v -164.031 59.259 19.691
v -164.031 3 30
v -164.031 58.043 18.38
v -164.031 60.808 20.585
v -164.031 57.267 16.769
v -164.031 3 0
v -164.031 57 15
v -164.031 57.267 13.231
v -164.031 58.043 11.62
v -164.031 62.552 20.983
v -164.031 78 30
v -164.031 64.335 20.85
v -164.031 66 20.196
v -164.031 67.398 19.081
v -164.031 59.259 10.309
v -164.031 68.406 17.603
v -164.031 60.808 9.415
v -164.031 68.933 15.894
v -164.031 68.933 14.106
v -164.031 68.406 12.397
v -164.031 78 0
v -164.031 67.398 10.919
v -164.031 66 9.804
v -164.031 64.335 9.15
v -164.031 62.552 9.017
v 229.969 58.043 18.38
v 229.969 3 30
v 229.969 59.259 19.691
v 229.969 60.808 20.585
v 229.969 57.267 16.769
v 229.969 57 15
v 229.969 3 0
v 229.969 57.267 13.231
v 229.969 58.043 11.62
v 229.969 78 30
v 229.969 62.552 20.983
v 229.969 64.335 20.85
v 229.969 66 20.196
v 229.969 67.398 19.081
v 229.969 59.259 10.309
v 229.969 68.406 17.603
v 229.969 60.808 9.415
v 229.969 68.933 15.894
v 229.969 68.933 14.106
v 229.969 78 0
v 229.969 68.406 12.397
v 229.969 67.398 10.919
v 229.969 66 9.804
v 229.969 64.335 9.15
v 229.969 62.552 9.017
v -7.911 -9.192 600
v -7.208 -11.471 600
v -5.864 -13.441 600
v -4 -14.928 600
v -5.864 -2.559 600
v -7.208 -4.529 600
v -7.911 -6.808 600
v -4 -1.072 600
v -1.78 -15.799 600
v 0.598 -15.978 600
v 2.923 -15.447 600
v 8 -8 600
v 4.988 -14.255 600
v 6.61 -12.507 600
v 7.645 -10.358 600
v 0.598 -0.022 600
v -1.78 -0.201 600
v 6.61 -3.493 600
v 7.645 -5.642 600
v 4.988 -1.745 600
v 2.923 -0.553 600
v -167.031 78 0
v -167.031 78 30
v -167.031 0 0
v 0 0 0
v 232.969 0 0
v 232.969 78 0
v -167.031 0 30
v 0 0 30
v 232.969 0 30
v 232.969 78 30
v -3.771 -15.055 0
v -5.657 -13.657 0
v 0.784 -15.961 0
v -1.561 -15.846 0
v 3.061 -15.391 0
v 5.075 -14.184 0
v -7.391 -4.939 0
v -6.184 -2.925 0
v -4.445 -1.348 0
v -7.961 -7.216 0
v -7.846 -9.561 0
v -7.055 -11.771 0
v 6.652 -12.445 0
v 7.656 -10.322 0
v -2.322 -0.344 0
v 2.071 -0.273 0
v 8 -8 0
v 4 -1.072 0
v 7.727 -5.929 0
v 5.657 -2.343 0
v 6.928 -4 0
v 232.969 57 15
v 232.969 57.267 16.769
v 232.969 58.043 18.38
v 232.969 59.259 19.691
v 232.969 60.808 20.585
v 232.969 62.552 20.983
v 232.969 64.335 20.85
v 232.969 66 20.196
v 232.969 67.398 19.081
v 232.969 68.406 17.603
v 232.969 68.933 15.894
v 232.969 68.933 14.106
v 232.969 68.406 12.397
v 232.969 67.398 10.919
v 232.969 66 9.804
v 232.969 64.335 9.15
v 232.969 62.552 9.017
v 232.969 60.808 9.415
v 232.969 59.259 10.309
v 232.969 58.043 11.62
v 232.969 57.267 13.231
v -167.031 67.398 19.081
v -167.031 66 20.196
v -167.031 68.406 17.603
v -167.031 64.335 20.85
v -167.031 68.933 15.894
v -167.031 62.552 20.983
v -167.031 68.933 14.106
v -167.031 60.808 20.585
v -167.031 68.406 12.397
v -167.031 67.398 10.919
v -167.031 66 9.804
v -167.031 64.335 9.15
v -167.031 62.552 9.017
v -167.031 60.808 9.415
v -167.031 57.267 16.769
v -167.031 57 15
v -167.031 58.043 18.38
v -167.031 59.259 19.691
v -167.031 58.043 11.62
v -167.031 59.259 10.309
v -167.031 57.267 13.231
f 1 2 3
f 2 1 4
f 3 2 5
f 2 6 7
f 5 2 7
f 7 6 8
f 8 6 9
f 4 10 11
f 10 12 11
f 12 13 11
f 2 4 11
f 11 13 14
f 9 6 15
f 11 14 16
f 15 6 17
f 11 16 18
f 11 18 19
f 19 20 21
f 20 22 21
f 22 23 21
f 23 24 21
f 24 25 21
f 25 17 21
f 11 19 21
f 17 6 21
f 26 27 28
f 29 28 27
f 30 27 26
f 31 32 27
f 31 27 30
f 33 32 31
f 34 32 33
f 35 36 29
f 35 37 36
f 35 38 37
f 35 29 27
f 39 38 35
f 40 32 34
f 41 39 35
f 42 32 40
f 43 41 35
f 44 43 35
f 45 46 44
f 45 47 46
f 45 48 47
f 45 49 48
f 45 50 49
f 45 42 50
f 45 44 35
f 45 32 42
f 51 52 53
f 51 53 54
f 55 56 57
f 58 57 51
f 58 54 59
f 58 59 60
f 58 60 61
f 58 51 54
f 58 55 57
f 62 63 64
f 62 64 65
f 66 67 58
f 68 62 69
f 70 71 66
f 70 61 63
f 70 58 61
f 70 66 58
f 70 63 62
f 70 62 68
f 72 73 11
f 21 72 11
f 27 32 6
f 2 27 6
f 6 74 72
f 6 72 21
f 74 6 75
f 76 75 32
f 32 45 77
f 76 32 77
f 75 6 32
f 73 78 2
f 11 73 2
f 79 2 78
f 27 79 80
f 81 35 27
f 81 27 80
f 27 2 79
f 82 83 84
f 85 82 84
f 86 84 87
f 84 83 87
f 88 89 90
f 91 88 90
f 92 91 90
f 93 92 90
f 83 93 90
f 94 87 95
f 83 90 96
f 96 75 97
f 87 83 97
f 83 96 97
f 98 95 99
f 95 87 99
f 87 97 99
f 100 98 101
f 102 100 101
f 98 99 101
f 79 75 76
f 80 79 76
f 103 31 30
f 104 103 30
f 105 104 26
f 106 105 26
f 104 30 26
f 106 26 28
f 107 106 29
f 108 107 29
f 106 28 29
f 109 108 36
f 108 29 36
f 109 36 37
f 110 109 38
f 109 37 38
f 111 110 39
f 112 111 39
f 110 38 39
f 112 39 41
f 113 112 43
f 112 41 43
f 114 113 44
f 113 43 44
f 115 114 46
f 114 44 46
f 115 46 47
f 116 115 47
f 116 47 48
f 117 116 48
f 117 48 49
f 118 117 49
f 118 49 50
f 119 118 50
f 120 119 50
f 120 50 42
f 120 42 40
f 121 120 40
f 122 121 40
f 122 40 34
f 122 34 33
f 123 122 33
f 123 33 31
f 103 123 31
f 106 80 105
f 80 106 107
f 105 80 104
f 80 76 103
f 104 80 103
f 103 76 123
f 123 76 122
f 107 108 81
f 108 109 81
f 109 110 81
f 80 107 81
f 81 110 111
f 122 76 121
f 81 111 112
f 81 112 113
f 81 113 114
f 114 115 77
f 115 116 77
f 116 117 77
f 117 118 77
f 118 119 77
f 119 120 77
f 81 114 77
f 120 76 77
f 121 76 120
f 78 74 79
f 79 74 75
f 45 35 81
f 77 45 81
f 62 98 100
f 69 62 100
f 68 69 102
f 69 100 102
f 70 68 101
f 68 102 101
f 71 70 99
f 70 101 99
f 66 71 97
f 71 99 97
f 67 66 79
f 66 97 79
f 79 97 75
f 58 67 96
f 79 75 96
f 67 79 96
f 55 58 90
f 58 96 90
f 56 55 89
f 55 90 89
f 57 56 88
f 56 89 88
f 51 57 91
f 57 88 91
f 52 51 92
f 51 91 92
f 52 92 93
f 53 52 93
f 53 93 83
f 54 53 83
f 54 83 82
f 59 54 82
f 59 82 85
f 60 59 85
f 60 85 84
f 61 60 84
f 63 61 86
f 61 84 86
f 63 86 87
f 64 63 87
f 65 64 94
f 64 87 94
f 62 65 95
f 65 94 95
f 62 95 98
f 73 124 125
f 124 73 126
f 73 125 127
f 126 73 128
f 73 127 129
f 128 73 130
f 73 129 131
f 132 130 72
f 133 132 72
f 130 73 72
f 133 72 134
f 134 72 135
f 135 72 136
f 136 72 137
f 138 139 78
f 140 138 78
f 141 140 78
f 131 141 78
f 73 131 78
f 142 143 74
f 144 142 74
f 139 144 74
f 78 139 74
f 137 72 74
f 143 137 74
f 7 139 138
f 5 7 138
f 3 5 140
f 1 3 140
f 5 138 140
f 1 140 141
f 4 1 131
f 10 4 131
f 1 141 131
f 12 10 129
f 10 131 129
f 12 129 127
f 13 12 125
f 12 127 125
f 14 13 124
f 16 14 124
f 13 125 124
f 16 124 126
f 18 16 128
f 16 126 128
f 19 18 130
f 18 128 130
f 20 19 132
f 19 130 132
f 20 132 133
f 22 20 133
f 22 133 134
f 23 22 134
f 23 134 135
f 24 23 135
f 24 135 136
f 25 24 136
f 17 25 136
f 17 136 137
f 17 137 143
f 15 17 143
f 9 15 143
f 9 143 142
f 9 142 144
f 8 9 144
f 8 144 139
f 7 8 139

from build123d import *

# Parameters (mm, degrees)
F0_W     = 3
F0_H     = 75
F1_DEPTH = 30
F2_R     = 6
F3_DEPTH = 500
F4_R     = 8
F5_DEPTH = 600


with BuildPart() as f1:
    # F0 (on Top) → F1 (new body)
    with BuildSketch(Plane.XY):
        Polygon((-167.031321, 3), (-167.031321, 0), (232.968679, 0), (232.968679, 3), (229.968679, 3), (-164.031321, 3), align=None)
        with Locations((-165.531321, 40.5)):
            Rectangle(F0_W, F0_H)
        with Locations((231.468679, 40.5)):
            Rectangle(F0_W, F0_H)
    extrude(amount=F1_DEPTH)

    # F2 (on face) → F3 (cut)
    with BuildSketch(Plane(origin=(-167.031321, 0, 0), x_dir=(0, -1, 0), z_dir=(-1, 0, 0))):
        with Locations((-63, 15)):
            Circle(F2_R)
    extrude(amount=-F3_DEPTH, mode=Mode.SUBTRACT)

    # F4 (on Top) → F5 (join)
    with BuildSketch(Plane.XY):
        with Locations((0, -8)):
            Circle(F4_R)
    extrude(amount=F5_DEPTH)


solid = f1.part
